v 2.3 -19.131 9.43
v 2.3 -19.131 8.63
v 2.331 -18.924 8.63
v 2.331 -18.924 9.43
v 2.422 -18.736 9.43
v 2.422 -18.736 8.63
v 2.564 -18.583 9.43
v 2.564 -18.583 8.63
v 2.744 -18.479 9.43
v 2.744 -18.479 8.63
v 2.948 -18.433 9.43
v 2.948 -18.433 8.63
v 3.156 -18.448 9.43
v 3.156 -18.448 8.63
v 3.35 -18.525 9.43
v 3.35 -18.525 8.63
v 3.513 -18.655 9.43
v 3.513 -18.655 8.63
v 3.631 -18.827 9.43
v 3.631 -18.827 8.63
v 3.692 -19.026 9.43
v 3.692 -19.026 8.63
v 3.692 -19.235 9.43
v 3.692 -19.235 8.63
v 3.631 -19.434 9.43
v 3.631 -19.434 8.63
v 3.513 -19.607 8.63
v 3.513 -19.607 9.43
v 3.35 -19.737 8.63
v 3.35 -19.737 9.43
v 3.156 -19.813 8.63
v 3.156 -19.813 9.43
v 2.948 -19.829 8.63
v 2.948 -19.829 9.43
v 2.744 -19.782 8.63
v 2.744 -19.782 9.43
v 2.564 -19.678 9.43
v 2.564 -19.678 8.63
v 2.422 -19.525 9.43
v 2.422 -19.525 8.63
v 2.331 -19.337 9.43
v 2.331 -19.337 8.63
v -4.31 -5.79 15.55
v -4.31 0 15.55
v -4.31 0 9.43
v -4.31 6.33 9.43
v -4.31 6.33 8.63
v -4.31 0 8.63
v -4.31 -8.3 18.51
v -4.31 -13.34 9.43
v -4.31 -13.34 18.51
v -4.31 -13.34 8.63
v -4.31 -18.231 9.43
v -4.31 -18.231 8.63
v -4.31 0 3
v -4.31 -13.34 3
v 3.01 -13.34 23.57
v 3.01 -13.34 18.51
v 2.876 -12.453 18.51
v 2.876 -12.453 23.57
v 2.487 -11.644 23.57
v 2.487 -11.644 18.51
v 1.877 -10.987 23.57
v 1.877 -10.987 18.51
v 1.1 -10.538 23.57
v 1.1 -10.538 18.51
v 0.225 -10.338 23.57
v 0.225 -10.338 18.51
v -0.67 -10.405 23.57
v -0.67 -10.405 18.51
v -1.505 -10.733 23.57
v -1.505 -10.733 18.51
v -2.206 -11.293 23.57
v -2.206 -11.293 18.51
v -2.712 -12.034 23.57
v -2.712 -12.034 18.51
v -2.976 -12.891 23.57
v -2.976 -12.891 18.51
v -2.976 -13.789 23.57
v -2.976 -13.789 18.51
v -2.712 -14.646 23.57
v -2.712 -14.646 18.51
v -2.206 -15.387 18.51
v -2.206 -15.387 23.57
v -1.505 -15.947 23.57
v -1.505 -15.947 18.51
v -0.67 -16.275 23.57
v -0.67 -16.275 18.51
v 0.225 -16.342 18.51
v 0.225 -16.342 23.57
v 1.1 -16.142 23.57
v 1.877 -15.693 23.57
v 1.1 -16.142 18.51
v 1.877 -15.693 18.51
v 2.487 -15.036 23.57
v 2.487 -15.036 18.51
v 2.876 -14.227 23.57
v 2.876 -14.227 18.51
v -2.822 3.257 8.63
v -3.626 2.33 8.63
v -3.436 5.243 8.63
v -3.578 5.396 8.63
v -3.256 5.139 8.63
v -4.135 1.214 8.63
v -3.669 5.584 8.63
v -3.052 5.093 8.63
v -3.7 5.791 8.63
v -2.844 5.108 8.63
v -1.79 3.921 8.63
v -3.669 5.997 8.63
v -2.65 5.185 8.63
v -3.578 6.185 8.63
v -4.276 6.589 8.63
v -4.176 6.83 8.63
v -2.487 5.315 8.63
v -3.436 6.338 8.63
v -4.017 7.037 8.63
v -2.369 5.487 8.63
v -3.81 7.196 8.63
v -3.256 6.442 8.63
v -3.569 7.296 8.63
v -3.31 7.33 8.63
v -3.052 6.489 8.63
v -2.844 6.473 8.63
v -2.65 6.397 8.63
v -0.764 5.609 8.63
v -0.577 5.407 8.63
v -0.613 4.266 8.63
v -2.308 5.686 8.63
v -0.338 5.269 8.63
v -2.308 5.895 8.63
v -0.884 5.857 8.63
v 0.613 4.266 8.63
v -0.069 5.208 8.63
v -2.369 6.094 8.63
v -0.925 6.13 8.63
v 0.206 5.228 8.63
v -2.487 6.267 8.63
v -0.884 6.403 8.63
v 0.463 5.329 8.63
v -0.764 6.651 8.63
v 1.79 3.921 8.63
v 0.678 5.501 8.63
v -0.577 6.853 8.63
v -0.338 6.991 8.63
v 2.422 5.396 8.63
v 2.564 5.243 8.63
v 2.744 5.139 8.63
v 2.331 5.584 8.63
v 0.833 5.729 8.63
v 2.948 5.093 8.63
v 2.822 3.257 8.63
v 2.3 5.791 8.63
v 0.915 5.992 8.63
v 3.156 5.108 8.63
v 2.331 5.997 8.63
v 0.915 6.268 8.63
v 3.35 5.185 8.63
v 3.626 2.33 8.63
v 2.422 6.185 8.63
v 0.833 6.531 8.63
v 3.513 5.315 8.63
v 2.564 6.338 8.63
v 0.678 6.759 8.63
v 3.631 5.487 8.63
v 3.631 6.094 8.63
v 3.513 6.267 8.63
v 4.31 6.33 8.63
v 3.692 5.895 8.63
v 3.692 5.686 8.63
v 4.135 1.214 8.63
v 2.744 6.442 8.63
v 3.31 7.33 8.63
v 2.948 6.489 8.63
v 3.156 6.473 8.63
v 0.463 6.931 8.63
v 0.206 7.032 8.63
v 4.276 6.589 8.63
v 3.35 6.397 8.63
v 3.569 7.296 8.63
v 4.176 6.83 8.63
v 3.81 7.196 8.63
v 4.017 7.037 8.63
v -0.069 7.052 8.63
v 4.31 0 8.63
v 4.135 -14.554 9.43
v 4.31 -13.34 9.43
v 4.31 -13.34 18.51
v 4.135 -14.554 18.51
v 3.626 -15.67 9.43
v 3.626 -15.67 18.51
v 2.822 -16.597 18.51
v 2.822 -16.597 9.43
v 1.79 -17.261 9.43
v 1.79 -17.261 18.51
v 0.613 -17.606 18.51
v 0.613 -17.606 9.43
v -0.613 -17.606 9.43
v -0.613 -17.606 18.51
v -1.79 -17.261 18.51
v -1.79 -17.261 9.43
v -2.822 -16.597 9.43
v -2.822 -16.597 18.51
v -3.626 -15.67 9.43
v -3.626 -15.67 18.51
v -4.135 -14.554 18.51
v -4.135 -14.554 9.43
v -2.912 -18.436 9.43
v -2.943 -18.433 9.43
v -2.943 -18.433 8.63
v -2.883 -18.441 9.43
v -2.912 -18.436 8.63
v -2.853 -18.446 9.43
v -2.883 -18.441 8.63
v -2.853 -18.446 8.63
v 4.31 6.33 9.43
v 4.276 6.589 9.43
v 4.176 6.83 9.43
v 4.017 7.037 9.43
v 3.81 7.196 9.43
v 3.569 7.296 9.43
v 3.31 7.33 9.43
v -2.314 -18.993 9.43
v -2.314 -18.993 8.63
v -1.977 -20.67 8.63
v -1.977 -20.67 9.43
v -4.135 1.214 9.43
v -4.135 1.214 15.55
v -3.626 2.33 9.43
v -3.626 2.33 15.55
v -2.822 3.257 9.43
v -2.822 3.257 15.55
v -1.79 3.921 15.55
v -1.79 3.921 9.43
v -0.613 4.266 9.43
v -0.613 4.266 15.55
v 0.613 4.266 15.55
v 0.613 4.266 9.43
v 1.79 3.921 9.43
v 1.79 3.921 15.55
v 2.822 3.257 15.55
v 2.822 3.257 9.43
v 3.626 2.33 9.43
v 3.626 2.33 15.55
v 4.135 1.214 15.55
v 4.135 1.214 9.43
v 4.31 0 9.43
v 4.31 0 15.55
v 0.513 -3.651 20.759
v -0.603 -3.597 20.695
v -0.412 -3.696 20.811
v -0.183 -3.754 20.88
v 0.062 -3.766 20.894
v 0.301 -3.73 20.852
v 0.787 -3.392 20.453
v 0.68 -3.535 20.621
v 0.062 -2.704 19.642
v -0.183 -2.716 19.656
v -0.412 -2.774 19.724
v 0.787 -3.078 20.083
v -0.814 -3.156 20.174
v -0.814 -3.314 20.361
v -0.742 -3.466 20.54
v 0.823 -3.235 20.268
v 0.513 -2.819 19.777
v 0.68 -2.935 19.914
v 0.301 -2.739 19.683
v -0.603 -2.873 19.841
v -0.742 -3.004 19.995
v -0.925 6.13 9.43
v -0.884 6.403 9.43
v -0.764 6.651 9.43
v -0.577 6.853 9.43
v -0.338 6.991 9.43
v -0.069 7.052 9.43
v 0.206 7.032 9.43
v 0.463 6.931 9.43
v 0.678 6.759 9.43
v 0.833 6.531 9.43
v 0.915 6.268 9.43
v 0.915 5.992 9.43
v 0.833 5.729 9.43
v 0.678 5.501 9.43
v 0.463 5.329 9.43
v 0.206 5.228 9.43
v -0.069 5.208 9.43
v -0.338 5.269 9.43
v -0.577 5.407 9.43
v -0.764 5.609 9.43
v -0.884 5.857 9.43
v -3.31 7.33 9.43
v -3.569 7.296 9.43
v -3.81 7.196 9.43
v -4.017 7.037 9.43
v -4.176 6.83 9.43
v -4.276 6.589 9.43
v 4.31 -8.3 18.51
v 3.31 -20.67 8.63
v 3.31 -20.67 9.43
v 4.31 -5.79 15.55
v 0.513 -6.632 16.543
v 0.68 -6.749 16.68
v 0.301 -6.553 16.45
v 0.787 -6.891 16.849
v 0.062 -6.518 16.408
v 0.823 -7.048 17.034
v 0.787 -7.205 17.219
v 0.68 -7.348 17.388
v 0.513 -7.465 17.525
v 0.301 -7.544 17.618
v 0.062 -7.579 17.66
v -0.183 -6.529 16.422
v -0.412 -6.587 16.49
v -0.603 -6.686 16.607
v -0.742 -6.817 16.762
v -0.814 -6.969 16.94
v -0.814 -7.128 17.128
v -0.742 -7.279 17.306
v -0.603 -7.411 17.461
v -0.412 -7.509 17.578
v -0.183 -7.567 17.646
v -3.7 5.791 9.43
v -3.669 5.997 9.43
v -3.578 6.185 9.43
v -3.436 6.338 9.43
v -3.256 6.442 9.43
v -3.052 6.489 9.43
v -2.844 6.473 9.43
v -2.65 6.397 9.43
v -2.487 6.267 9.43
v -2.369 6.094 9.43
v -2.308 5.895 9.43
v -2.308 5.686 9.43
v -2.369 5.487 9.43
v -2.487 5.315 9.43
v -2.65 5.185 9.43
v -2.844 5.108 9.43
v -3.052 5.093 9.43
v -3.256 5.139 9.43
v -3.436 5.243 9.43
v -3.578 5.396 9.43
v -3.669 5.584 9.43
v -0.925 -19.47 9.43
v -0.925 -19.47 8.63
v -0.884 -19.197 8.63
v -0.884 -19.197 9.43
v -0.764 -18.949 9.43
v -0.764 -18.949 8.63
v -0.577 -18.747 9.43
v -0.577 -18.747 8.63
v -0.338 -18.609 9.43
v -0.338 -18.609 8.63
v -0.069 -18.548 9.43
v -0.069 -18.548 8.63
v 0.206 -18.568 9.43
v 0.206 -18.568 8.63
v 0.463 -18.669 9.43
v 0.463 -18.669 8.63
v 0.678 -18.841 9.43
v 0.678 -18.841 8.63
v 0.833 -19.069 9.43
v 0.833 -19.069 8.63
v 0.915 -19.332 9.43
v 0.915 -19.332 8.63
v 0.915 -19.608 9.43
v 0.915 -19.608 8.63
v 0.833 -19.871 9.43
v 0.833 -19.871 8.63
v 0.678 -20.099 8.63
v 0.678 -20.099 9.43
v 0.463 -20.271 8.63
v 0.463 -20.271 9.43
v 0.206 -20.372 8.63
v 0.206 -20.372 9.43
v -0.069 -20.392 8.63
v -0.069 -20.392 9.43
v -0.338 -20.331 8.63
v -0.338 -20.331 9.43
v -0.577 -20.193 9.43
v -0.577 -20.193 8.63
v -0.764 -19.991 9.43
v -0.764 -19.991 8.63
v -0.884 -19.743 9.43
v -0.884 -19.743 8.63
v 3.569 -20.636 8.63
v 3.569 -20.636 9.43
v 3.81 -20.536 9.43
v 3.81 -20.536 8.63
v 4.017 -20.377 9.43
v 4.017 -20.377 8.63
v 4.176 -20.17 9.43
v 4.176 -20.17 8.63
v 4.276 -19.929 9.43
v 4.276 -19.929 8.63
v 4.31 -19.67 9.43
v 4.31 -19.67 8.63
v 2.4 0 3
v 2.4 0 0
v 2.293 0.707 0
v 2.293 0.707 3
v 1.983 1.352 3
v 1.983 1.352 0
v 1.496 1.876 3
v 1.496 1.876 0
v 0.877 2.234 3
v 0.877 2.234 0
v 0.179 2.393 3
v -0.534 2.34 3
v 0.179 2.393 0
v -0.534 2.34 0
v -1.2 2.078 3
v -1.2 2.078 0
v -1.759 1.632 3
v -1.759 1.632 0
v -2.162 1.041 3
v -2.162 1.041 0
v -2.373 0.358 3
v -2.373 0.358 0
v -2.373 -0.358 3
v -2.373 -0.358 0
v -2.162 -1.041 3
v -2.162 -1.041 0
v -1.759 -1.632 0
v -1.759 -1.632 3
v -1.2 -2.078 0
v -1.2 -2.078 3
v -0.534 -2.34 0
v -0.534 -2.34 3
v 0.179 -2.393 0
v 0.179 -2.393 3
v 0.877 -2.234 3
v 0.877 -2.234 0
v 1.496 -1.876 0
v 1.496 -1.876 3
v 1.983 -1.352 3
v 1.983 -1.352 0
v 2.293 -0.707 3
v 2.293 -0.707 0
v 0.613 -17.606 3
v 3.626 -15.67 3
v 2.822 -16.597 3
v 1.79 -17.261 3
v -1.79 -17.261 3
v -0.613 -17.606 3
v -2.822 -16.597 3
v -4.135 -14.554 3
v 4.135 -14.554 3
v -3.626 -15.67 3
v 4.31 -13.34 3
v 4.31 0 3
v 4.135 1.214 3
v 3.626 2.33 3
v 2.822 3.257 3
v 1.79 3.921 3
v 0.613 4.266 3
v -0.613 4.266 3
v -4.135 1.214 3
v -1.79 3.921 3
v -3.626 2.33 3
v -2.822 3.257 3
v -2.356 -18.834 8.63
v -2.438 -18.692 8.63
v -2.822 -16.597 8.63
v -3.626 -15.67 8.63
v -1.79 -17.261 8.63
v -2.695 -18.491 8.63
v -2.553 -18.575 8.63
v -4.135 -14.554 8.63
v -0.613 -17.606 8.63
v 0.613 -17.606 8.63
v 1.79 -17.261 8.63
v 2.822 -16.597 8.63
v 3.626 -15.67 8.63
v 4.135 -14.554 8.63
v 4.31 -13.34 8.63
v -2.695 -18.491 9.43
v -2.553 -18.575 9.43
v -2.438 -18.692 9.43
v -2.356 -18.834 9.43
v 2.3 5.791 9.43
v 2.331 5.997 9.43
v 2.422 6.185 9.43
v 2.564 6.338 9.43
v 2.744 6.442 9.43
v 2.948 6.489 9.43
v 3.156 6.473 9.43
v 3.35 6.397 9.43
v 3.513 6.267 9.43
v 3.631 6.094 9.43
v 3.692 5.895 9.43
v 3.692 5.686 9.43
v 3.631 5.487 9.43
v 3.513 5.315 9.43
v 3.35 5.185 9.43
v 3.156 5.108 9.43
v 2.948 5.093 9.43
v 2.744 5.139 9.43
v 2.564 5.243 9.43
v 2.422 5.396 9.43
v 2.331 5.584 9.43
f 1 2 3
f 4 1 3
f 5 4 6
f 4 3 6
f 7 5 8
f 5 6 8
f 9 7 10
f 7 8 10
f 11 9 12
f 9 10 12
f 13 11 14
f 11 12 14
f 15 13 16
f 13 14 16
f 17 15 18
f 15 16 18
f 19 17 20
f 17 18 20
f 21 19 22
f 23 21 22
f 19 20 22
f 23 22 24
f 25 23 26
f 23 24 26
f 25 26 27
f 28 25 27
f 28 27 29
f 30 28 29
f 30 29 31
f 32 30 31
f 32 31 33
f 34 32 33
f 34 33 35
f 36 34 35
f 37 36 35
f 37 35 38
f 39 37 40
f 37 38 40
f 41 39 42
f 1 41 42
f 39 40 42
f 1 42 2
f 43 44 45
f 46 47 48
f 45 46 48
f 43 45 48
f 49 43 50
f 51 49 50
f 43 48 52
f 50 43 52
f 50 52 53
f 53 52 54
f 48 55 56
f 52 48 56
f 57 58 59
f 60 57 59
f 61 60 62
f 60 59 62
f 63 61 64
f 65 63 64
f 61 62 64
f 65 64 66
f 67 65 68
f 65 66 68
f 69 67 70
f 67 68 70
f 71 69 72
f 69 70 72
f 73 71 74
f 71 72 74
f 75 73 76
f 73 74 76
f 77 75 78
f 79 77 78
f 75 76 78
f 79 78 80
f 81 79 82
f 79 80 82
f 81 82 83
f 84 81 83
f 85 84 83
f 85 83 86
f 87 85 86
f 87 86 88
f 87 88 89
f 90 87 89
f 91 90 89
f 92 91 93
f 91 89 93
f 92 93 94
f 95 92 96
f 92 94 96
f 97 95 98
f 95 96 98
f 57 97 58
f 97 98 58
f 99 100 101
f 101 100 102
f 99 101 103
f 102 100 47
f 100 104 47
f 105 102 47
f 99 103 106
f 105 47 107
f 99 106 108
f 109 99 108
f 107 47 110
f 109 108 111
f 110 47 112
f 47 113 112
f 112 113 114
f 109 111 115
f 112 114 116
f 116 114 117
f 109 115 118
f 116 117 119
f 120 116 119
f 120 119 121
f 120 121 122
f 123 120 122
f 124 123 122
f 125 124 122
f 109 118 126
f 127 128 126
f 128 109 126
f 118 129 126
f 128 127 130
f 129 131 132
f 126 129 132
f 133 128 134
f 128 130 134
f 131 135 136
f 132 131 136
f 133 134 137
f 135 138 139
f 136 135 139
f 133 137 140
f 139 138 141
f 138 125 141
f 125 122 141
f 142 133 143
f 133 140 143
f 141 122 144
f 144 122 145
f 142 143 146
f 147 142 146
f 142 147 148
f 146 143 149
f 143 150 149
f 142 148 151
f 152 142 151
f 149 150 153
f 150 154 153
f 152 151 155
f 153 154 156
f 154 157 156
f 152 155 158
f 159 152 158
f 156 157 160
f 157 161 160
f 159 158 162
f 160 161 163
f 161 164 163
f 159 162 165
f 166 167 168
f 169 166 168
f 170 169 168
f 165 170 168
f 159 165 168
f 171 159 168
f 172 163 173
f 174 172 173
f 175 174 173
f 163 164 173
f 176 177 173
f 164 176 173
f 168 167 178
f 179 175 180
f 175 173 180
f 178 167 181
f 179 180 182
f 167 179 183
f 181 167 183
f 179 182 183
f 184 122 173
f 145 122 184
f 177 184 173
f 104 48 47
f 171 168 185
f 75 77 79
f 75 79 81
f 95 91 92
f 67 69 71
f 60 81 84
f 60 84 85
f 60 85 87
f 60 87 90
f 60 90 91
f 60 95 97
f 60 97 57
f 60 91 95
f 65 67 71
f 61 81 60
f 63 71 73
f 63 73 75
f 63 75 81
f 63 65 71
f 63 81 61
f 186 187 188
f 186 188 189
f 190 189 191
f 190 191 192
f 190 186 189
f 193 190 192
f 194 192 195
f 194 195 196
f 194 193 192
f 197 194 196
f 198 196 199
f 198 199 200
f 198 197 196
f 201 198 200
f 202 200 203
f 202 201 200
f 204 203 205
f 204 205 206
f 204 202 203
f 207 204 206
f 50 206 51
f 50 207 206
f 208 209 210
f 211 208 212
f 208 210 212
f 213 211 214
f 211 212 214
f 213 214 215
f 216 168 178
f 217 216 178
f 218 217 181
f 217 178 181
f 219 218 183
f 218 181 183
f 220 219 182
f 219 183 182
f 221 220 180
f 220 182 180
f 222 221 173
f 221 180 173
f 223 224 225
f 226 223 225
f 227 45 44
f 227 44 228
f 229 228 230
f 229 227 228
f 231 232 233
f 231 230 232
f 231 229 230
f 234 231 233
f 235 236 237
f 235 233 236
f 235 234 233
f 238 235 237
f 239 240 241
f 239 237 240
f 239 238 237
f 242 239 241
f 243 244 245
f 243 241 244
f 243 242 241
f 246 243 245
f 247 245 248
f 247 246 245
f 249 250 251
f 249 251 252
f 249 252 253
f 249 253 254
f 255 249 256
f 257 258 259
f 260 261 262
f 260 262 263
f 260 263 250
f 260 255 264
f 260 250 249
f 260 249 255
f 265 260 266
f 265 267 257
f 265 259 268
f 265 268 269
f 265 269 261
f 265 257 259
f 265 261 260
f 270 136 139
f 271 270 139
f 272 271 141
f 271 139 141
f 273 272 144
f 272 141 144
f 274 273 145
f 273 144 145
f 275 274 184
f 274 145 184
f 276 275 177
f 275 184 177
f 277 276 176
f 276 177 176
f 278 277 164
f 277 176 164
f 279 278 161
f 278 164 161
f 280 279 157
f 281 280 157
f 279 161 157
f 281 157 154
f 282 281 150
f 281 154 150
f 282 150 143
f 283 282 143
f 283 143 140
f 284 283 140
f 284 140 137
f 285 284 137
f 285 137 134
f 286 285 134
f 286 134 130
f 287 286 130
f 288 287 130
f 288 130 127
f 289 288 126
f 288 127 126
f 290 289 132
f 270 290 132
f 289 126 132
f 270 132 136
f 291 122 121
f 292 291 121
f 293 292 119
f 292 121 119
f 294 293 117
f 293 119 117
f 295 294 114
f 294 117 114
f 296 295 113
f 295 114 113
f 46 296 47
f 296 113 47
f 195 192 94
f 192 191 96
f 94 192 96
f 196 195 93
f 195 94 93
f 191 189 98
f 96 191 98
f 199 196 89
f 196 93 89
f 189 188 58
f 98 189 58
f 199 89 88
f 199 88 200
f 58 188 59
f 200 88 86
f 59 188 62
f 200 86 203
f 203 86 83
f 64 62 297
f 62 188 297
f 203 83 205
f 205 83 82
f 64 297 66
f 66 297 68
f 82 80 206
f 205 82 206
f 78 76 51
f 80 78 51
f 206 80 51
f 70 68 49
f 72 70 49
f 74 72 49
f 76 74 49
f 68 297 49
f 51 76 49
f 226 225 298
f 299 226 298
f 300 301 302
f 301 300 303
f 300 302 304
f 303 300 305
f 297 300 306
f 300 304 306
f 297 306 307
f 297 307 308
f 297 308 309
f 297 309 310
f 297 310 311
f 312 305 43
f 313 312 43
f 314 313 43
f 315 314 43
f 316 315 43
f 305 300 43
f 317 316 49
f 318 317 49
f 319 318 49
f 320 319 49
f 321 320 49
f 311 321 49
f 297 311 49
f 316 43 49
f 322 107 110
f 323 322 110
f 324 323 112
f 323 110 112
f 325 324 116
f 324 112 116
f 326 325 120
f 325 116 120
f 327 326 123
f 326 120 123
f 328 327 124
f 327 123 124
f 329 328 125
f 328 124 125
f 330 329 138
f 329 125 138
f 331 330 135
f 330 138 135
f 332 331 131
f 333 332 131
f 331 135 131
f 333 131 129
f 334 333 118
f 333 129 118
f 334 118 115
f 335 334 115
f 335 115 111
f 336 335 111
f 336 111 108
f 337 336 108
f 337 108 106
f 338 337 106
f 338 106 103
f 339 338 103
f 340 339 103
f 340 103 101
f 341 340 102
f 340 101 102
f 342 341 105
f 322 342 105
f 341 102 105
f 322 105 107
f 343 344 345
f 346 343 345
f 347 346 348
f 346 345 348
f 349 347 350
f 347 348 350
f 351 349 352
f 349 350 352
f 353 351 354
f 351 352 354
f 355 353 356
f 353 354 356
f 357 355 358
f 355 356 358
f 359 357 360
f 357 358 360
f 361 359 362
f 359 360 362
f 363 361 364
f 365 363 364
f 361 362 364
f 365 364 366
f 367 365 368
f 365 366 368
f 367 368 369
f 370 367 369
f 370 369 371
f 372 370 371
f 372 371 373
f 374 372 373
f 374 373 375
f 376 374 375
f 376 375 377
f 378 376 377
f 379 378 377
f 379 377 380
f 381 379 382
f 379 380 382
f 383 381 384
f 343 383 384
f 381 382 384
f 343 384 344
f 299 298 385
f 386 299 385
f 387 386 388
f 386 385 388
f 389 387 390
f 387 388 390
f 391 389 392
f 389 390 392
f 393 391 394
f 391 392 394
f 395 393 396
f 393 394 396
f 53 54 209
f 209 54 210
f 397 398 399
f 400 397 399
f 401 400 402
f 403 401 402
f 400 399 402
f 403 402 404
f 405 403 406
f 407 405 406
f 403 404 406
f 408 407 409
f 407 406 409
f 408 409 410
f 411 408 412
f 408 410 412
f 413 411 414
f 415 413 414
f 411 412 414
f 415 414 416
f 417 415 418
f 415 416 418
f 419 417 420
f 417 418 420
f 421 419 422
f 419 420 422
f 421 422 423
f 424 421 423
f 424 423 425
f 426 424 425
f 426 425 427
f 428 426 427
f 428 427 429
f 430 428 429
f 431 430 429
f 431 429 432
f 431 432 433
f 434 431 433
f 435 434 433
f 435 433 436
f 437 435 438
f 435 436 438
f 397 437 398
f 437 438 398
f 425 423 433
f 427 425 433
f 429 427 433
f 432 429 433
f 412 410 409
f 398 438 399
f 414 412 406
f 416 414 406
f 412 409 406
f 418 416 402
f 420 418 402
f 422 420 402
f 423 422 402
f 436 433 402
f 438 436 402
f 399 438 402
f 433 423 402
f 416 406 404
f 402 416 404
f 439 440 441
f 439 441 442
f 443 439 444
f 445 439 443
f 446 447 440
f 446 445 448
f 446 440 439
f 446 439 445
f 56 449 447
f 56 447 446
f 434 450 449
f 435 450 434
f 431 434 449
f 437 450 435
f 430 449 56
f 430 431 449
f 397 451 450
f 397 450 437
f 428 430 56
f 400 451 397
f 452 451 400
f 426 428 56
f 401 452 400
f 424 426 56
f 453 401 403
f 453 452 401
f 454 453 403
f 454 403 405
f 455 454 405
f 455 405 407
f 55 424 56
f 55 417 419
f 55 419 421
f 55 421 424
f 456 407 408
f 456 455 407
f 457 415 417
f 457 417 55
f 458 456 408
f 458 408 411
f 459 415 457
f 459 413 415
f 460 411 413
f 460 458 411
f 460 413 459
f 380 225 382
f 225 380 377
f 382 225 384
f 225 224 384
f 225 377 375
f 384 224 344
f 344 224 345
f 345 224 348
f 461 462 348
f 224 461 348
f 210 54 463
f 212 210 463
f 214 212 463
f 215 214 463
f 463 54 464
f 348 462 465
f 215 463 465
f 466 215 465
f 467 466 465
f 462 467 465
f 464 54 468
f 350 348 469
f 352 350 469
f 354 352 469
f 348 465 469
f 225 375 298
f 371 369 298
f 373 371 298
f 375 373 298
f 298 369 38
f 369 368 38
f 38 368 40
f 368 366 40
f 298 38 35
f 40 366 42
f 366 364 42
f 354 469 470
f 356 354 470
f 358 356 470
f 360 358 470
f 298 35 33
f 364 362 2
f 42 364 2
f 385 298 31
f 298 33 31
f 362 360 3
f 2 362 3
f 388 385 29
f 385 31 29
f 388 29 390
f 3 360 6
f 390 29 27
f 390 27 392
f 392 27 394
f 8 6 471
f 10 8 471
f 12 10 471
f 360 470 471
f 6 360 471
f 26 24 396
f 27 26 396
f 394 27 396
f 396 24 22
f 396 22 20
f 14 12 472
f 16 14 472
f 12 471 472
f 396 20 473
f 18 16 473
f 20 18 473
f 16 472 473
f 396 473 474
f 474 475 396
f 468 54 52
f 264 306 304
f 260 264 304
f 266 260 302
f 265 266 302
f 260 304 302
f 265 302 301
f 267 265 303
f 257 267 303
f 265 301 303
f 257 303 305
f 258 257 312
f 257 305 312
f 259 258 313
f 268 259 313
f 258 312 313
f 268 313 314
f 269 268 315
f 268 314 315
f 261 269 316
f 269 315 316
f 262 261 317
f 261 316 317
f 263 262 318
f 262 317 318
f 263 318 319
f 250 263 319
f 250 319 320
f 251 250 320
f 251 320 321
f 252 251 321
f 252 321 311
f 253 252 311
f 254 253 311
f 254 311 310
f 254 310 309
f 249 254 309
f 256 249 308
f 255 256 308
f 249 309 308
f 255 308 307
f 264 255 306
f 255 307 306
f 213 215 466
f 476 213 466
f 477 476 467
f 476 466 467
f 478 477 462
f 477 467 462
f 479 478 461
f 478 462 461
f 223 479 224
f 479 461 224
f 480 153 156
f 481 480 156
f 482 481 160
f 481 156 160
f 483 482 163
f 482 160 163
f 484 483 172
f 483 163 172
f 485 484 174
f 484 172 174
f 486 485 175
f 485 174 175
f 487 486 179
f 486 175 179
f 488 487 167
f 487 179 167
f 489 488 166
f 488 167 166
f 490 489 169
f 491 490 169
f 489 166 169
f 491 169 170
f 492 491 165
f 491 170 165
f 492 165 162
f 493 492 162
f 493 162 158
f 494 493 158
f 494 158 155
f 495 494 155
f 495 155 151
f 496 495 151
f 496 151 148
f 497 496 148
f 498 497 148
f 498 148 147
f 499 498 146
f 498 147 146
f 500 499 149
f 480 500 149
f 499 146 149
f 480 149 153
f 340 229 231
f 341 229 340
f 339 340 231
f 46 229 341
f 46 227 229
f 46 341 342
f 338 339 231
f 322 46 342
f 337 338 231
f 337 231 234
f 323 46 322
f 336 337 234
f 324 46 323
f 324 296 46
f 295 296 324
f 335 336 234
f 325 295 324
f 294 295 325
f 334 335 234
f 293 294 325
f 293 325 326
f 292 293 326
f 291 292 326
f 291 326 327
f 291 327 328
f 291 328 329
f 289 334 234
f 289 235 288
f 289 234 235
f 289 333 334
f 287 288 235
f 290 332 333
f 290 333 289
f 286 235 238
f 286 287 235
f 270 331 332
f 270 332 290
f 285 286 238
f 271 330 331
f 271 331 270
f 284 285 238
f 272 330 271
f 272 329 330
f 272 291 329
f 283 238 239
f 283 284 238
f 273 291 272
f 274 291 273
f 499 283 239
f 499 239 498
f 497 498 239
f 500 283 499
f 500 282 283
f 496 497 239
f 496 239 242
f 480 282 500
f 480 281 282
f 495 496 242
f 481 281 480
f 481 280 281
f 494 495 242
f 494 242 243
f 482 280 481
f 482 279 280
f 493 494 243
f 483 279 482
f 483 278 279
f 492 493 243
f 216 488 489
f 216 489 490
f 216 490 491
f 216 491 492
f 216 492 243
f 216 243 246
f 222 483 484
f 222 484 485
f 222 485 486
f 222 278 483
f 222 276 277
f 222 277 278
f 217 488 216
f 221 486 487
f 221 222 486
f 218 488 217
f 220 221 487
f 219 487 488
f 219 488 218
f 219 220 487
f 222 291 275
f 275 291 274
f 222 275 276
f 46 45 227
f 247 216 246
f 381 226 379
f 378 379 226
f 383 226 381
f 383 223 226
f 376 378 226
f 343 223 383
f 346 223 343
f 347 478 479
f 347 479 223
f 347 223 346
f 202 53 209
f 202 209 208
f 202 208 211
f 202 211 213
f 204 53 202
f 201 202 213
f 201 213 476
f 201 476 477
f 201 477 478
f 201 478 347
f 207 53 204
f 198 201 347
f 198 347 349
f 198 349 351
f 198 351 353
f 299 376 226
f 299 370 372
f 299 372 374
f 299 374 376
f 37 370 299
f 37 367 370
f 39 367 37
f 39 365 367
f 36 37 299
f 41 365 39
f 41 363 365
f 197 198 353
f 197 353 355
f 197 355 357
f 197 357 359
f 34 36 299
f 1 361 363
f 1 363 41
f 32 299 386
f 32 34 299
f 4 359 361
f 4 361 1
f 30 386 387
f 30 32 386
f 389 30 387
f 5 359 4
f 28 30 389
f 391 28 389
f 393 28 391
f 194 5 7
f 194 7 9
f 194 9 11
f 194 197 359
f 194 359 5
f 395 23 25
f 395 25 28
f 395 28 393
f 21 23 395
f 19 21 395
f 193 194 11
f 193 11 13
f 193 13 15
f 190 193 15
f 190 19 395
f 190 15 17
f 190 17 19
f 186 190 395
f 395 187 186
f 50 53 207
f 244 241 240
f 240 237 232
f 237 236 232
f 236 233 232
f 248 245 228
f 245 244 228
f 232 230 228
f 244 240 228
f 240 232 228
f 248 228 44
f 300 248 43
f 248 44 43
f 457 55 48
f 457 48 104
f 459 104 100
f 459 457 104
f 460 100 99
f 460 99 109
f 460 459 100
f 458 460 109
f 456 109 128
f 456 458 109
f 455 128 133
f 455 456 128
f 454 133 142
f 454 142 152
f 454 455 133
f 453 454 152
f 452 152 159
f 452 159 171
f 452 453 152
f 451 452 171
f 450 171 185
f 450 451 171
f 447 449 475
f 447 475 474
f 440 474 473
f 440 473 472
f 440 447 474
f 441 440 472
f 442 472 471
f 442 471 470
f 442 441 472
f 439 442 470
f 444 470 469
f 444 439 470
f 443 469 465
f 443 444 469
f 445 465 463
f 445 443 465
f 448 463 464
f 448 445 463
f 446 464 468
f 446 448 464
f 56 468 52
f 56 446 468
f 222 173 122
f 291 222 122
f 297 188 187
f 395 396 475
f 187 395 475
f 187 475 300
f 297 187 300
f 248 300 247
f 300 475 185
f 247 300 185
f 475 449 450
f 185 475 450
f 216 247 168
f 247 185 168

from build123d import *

# Parameters (mm, degrees)
SKETCH1_R               = 2.4
BOSS_EXTRUDE1_DEPTH     = 3
BOSS_EXTRUDE2_DEPTH     = 15.51
CUT_EXTRUDE1_DEPTH      = 5.31
CUT_EXTRUDE1_DEPTH_BACK = 5.31
SKETCH4_R               = 3.01
BOSS_EXTRUDE3_DEPTH     = 5.06
SKETCH5_R               = 0.925
SKETCH5_R_2             = 0.7
BOSS_EXTRUDE4_DEPTH     = 0.8
SKETCH6_R               = 0.823117729
BOSS_EXTRUDE5_DEPTH     = 5
CUT_EXTRUDE2_DEPTH      = 10


with BuildPart() as part:
    # Sketch1 → Boss-Extrude1 (new body)
    with BuildSketch(Plane.XY):
        Circle(SKETCH1_R)
    extrude(amount=BOSS_EXTRUDE1_DEPTH)

    # Sketch2 → Boss-Extrude2 (add)
    with BuildSketch(Plane.XY.offset(3)):
        with BuildLine():
            Line((4.31, 0), (4.31, -13.34))
            ThreePointArc((4.31, -13.34), (0, -17.65), (-4.31, -13.34))
            Line((-4.31, -13.34), (-4.31, 0))
            ThreePointArc((-4.31, 0), (0, 4.31), (4.31, 0))
        make_face()
    extrude(amount=BOSS_EXTRUDE2_DEPTH)

    # Sketch3 → Cut-Extrude1 (cut, two sides)
    with BuildSketch(Plane(origin=(0, 0, 0), x_dir=(0, 0, -1), z_dir=(1, 0, 0))) as cut_extrude1_sk:
        Polygon((-18.51, 4.31), (-15.55, 4.31), (-15.55, -5.79), (-18.51, -8.3), align=None)
    extrude(amount=CUT_EXTRUDE1_DEPTH, mode=Mode.SUBTRACT)
    extrude(cut_extrude1_sk.sketch, amount=-CUT_EXTRUDE1_DEPTH_BACK, mode=Mode.SUBTRACT)

    # Sketch4 → Boss-Extrude3 (add)
    with BuildSketch(Plane.XY.offset(18.51)):
        with Locations((0, -13.34)):
            Circle(SKETCH4_R)
    extrude(amount=BOSS_EXTRUDE3_DEPTH)

    # Sketch5 → Boss-Extrude4 (add)
    with BuildSketch(Plane(origin=(0, 0, 8.63), x_dir=(-1, 0, 0), z_dir=(0, 0, -1))):
        with BuildLine():
            Line((-3.31, 7.33), (3.31, 7.33))
            ThreePointArc((3.31, 7.33), (4.017106781, 7.037106781), (4.31, 6.33))
            Line((4.31, 6.33), (4.31, -19.67))
            ThreePointArc((4.31, -19.67), (4.017106781, -20.377106781), (3.31, -20.67))
            Line((3.31, -20.67), (-3.31, -20.67))
            ThreePointArc((-3.31, -20.67), (-4.017106781, -20.377106781), (-4.31, -19.67))
            Line((-4.31, -19.67), (-4.31, 6.33))
            ThreePointArc((-4.31, 6.33), (-4.017106781, 7.037106781), (-3.31, 7.33))
        make_face()
        with Locations((0, 6.13)):
            Circle(SKETCH5_R, mode=Mode.SUBTRACT)
        with Locations((3, 5.79076381)):
            Circle(SKETCH5_R_2, mode=Mode.SUBTRACT)
        with Locations((-3, 5.79076381)):
            Circle(SKETCH5_R_2, mode=Mode.SUBTRACT)
        with Locations((3, -19.13076381)):
            Circle(SKETCH5_R_2, mode=Mode.SUBTRACT)
        with Locations((0, -19.47)):
            Circle(SKETCH5_R, mode=Mode.SUBTRACT)
        with Locations((-3, -19.13076381)):
            Circle(SKETCH5_R_2, mode=Mode.SUBTRACT)
    extrude(amount=-BOSS_EXTRUDE4_DEPTH)

    # Sketch6 → Boss-Extrude5 (add)
    with BuildSketch(Plane(origin=(0, 4.302344091, 3.64827151), x_dir=(1, 0, 0), z_dir=(0, 0.7627017, 0.646750428))):
        with Locations((0, -17.550441075)):
            Circle(SKETCH6_R)
    extrude(amount=BOSS_EXTRUDE5_DEPTH)

    # Sketch7 → Cut-Extrude2 (cut)
    with BuildSketch(Plane(origin=(0, 0, 8.63), x_dir=(-1, 0, 0), z_dir=(0, 0, -1))):
        with BuildLine():
            Line((2.313724821, -18.992827668), (1.90235458, -21.039522477))
            Line((1.90235458, -21.039522477), (5.963625728, -21.039522477))
            Line((5.963625728, -21.039522477), (5.695977486, -18.025570536))
            Line((5.695977486, -18.025570536), (2.852857547, -18.446403453))
            ThreePointArc((2.852857547, -18.446403453), (2.491968028, -18.629511021), (2.313724821, -18.992827668))
        make_face()
    extrude(amount=-CUT_EXTRUDE2_DEPTH, mode=Mode.SUBTRACT)


solid = part.part
